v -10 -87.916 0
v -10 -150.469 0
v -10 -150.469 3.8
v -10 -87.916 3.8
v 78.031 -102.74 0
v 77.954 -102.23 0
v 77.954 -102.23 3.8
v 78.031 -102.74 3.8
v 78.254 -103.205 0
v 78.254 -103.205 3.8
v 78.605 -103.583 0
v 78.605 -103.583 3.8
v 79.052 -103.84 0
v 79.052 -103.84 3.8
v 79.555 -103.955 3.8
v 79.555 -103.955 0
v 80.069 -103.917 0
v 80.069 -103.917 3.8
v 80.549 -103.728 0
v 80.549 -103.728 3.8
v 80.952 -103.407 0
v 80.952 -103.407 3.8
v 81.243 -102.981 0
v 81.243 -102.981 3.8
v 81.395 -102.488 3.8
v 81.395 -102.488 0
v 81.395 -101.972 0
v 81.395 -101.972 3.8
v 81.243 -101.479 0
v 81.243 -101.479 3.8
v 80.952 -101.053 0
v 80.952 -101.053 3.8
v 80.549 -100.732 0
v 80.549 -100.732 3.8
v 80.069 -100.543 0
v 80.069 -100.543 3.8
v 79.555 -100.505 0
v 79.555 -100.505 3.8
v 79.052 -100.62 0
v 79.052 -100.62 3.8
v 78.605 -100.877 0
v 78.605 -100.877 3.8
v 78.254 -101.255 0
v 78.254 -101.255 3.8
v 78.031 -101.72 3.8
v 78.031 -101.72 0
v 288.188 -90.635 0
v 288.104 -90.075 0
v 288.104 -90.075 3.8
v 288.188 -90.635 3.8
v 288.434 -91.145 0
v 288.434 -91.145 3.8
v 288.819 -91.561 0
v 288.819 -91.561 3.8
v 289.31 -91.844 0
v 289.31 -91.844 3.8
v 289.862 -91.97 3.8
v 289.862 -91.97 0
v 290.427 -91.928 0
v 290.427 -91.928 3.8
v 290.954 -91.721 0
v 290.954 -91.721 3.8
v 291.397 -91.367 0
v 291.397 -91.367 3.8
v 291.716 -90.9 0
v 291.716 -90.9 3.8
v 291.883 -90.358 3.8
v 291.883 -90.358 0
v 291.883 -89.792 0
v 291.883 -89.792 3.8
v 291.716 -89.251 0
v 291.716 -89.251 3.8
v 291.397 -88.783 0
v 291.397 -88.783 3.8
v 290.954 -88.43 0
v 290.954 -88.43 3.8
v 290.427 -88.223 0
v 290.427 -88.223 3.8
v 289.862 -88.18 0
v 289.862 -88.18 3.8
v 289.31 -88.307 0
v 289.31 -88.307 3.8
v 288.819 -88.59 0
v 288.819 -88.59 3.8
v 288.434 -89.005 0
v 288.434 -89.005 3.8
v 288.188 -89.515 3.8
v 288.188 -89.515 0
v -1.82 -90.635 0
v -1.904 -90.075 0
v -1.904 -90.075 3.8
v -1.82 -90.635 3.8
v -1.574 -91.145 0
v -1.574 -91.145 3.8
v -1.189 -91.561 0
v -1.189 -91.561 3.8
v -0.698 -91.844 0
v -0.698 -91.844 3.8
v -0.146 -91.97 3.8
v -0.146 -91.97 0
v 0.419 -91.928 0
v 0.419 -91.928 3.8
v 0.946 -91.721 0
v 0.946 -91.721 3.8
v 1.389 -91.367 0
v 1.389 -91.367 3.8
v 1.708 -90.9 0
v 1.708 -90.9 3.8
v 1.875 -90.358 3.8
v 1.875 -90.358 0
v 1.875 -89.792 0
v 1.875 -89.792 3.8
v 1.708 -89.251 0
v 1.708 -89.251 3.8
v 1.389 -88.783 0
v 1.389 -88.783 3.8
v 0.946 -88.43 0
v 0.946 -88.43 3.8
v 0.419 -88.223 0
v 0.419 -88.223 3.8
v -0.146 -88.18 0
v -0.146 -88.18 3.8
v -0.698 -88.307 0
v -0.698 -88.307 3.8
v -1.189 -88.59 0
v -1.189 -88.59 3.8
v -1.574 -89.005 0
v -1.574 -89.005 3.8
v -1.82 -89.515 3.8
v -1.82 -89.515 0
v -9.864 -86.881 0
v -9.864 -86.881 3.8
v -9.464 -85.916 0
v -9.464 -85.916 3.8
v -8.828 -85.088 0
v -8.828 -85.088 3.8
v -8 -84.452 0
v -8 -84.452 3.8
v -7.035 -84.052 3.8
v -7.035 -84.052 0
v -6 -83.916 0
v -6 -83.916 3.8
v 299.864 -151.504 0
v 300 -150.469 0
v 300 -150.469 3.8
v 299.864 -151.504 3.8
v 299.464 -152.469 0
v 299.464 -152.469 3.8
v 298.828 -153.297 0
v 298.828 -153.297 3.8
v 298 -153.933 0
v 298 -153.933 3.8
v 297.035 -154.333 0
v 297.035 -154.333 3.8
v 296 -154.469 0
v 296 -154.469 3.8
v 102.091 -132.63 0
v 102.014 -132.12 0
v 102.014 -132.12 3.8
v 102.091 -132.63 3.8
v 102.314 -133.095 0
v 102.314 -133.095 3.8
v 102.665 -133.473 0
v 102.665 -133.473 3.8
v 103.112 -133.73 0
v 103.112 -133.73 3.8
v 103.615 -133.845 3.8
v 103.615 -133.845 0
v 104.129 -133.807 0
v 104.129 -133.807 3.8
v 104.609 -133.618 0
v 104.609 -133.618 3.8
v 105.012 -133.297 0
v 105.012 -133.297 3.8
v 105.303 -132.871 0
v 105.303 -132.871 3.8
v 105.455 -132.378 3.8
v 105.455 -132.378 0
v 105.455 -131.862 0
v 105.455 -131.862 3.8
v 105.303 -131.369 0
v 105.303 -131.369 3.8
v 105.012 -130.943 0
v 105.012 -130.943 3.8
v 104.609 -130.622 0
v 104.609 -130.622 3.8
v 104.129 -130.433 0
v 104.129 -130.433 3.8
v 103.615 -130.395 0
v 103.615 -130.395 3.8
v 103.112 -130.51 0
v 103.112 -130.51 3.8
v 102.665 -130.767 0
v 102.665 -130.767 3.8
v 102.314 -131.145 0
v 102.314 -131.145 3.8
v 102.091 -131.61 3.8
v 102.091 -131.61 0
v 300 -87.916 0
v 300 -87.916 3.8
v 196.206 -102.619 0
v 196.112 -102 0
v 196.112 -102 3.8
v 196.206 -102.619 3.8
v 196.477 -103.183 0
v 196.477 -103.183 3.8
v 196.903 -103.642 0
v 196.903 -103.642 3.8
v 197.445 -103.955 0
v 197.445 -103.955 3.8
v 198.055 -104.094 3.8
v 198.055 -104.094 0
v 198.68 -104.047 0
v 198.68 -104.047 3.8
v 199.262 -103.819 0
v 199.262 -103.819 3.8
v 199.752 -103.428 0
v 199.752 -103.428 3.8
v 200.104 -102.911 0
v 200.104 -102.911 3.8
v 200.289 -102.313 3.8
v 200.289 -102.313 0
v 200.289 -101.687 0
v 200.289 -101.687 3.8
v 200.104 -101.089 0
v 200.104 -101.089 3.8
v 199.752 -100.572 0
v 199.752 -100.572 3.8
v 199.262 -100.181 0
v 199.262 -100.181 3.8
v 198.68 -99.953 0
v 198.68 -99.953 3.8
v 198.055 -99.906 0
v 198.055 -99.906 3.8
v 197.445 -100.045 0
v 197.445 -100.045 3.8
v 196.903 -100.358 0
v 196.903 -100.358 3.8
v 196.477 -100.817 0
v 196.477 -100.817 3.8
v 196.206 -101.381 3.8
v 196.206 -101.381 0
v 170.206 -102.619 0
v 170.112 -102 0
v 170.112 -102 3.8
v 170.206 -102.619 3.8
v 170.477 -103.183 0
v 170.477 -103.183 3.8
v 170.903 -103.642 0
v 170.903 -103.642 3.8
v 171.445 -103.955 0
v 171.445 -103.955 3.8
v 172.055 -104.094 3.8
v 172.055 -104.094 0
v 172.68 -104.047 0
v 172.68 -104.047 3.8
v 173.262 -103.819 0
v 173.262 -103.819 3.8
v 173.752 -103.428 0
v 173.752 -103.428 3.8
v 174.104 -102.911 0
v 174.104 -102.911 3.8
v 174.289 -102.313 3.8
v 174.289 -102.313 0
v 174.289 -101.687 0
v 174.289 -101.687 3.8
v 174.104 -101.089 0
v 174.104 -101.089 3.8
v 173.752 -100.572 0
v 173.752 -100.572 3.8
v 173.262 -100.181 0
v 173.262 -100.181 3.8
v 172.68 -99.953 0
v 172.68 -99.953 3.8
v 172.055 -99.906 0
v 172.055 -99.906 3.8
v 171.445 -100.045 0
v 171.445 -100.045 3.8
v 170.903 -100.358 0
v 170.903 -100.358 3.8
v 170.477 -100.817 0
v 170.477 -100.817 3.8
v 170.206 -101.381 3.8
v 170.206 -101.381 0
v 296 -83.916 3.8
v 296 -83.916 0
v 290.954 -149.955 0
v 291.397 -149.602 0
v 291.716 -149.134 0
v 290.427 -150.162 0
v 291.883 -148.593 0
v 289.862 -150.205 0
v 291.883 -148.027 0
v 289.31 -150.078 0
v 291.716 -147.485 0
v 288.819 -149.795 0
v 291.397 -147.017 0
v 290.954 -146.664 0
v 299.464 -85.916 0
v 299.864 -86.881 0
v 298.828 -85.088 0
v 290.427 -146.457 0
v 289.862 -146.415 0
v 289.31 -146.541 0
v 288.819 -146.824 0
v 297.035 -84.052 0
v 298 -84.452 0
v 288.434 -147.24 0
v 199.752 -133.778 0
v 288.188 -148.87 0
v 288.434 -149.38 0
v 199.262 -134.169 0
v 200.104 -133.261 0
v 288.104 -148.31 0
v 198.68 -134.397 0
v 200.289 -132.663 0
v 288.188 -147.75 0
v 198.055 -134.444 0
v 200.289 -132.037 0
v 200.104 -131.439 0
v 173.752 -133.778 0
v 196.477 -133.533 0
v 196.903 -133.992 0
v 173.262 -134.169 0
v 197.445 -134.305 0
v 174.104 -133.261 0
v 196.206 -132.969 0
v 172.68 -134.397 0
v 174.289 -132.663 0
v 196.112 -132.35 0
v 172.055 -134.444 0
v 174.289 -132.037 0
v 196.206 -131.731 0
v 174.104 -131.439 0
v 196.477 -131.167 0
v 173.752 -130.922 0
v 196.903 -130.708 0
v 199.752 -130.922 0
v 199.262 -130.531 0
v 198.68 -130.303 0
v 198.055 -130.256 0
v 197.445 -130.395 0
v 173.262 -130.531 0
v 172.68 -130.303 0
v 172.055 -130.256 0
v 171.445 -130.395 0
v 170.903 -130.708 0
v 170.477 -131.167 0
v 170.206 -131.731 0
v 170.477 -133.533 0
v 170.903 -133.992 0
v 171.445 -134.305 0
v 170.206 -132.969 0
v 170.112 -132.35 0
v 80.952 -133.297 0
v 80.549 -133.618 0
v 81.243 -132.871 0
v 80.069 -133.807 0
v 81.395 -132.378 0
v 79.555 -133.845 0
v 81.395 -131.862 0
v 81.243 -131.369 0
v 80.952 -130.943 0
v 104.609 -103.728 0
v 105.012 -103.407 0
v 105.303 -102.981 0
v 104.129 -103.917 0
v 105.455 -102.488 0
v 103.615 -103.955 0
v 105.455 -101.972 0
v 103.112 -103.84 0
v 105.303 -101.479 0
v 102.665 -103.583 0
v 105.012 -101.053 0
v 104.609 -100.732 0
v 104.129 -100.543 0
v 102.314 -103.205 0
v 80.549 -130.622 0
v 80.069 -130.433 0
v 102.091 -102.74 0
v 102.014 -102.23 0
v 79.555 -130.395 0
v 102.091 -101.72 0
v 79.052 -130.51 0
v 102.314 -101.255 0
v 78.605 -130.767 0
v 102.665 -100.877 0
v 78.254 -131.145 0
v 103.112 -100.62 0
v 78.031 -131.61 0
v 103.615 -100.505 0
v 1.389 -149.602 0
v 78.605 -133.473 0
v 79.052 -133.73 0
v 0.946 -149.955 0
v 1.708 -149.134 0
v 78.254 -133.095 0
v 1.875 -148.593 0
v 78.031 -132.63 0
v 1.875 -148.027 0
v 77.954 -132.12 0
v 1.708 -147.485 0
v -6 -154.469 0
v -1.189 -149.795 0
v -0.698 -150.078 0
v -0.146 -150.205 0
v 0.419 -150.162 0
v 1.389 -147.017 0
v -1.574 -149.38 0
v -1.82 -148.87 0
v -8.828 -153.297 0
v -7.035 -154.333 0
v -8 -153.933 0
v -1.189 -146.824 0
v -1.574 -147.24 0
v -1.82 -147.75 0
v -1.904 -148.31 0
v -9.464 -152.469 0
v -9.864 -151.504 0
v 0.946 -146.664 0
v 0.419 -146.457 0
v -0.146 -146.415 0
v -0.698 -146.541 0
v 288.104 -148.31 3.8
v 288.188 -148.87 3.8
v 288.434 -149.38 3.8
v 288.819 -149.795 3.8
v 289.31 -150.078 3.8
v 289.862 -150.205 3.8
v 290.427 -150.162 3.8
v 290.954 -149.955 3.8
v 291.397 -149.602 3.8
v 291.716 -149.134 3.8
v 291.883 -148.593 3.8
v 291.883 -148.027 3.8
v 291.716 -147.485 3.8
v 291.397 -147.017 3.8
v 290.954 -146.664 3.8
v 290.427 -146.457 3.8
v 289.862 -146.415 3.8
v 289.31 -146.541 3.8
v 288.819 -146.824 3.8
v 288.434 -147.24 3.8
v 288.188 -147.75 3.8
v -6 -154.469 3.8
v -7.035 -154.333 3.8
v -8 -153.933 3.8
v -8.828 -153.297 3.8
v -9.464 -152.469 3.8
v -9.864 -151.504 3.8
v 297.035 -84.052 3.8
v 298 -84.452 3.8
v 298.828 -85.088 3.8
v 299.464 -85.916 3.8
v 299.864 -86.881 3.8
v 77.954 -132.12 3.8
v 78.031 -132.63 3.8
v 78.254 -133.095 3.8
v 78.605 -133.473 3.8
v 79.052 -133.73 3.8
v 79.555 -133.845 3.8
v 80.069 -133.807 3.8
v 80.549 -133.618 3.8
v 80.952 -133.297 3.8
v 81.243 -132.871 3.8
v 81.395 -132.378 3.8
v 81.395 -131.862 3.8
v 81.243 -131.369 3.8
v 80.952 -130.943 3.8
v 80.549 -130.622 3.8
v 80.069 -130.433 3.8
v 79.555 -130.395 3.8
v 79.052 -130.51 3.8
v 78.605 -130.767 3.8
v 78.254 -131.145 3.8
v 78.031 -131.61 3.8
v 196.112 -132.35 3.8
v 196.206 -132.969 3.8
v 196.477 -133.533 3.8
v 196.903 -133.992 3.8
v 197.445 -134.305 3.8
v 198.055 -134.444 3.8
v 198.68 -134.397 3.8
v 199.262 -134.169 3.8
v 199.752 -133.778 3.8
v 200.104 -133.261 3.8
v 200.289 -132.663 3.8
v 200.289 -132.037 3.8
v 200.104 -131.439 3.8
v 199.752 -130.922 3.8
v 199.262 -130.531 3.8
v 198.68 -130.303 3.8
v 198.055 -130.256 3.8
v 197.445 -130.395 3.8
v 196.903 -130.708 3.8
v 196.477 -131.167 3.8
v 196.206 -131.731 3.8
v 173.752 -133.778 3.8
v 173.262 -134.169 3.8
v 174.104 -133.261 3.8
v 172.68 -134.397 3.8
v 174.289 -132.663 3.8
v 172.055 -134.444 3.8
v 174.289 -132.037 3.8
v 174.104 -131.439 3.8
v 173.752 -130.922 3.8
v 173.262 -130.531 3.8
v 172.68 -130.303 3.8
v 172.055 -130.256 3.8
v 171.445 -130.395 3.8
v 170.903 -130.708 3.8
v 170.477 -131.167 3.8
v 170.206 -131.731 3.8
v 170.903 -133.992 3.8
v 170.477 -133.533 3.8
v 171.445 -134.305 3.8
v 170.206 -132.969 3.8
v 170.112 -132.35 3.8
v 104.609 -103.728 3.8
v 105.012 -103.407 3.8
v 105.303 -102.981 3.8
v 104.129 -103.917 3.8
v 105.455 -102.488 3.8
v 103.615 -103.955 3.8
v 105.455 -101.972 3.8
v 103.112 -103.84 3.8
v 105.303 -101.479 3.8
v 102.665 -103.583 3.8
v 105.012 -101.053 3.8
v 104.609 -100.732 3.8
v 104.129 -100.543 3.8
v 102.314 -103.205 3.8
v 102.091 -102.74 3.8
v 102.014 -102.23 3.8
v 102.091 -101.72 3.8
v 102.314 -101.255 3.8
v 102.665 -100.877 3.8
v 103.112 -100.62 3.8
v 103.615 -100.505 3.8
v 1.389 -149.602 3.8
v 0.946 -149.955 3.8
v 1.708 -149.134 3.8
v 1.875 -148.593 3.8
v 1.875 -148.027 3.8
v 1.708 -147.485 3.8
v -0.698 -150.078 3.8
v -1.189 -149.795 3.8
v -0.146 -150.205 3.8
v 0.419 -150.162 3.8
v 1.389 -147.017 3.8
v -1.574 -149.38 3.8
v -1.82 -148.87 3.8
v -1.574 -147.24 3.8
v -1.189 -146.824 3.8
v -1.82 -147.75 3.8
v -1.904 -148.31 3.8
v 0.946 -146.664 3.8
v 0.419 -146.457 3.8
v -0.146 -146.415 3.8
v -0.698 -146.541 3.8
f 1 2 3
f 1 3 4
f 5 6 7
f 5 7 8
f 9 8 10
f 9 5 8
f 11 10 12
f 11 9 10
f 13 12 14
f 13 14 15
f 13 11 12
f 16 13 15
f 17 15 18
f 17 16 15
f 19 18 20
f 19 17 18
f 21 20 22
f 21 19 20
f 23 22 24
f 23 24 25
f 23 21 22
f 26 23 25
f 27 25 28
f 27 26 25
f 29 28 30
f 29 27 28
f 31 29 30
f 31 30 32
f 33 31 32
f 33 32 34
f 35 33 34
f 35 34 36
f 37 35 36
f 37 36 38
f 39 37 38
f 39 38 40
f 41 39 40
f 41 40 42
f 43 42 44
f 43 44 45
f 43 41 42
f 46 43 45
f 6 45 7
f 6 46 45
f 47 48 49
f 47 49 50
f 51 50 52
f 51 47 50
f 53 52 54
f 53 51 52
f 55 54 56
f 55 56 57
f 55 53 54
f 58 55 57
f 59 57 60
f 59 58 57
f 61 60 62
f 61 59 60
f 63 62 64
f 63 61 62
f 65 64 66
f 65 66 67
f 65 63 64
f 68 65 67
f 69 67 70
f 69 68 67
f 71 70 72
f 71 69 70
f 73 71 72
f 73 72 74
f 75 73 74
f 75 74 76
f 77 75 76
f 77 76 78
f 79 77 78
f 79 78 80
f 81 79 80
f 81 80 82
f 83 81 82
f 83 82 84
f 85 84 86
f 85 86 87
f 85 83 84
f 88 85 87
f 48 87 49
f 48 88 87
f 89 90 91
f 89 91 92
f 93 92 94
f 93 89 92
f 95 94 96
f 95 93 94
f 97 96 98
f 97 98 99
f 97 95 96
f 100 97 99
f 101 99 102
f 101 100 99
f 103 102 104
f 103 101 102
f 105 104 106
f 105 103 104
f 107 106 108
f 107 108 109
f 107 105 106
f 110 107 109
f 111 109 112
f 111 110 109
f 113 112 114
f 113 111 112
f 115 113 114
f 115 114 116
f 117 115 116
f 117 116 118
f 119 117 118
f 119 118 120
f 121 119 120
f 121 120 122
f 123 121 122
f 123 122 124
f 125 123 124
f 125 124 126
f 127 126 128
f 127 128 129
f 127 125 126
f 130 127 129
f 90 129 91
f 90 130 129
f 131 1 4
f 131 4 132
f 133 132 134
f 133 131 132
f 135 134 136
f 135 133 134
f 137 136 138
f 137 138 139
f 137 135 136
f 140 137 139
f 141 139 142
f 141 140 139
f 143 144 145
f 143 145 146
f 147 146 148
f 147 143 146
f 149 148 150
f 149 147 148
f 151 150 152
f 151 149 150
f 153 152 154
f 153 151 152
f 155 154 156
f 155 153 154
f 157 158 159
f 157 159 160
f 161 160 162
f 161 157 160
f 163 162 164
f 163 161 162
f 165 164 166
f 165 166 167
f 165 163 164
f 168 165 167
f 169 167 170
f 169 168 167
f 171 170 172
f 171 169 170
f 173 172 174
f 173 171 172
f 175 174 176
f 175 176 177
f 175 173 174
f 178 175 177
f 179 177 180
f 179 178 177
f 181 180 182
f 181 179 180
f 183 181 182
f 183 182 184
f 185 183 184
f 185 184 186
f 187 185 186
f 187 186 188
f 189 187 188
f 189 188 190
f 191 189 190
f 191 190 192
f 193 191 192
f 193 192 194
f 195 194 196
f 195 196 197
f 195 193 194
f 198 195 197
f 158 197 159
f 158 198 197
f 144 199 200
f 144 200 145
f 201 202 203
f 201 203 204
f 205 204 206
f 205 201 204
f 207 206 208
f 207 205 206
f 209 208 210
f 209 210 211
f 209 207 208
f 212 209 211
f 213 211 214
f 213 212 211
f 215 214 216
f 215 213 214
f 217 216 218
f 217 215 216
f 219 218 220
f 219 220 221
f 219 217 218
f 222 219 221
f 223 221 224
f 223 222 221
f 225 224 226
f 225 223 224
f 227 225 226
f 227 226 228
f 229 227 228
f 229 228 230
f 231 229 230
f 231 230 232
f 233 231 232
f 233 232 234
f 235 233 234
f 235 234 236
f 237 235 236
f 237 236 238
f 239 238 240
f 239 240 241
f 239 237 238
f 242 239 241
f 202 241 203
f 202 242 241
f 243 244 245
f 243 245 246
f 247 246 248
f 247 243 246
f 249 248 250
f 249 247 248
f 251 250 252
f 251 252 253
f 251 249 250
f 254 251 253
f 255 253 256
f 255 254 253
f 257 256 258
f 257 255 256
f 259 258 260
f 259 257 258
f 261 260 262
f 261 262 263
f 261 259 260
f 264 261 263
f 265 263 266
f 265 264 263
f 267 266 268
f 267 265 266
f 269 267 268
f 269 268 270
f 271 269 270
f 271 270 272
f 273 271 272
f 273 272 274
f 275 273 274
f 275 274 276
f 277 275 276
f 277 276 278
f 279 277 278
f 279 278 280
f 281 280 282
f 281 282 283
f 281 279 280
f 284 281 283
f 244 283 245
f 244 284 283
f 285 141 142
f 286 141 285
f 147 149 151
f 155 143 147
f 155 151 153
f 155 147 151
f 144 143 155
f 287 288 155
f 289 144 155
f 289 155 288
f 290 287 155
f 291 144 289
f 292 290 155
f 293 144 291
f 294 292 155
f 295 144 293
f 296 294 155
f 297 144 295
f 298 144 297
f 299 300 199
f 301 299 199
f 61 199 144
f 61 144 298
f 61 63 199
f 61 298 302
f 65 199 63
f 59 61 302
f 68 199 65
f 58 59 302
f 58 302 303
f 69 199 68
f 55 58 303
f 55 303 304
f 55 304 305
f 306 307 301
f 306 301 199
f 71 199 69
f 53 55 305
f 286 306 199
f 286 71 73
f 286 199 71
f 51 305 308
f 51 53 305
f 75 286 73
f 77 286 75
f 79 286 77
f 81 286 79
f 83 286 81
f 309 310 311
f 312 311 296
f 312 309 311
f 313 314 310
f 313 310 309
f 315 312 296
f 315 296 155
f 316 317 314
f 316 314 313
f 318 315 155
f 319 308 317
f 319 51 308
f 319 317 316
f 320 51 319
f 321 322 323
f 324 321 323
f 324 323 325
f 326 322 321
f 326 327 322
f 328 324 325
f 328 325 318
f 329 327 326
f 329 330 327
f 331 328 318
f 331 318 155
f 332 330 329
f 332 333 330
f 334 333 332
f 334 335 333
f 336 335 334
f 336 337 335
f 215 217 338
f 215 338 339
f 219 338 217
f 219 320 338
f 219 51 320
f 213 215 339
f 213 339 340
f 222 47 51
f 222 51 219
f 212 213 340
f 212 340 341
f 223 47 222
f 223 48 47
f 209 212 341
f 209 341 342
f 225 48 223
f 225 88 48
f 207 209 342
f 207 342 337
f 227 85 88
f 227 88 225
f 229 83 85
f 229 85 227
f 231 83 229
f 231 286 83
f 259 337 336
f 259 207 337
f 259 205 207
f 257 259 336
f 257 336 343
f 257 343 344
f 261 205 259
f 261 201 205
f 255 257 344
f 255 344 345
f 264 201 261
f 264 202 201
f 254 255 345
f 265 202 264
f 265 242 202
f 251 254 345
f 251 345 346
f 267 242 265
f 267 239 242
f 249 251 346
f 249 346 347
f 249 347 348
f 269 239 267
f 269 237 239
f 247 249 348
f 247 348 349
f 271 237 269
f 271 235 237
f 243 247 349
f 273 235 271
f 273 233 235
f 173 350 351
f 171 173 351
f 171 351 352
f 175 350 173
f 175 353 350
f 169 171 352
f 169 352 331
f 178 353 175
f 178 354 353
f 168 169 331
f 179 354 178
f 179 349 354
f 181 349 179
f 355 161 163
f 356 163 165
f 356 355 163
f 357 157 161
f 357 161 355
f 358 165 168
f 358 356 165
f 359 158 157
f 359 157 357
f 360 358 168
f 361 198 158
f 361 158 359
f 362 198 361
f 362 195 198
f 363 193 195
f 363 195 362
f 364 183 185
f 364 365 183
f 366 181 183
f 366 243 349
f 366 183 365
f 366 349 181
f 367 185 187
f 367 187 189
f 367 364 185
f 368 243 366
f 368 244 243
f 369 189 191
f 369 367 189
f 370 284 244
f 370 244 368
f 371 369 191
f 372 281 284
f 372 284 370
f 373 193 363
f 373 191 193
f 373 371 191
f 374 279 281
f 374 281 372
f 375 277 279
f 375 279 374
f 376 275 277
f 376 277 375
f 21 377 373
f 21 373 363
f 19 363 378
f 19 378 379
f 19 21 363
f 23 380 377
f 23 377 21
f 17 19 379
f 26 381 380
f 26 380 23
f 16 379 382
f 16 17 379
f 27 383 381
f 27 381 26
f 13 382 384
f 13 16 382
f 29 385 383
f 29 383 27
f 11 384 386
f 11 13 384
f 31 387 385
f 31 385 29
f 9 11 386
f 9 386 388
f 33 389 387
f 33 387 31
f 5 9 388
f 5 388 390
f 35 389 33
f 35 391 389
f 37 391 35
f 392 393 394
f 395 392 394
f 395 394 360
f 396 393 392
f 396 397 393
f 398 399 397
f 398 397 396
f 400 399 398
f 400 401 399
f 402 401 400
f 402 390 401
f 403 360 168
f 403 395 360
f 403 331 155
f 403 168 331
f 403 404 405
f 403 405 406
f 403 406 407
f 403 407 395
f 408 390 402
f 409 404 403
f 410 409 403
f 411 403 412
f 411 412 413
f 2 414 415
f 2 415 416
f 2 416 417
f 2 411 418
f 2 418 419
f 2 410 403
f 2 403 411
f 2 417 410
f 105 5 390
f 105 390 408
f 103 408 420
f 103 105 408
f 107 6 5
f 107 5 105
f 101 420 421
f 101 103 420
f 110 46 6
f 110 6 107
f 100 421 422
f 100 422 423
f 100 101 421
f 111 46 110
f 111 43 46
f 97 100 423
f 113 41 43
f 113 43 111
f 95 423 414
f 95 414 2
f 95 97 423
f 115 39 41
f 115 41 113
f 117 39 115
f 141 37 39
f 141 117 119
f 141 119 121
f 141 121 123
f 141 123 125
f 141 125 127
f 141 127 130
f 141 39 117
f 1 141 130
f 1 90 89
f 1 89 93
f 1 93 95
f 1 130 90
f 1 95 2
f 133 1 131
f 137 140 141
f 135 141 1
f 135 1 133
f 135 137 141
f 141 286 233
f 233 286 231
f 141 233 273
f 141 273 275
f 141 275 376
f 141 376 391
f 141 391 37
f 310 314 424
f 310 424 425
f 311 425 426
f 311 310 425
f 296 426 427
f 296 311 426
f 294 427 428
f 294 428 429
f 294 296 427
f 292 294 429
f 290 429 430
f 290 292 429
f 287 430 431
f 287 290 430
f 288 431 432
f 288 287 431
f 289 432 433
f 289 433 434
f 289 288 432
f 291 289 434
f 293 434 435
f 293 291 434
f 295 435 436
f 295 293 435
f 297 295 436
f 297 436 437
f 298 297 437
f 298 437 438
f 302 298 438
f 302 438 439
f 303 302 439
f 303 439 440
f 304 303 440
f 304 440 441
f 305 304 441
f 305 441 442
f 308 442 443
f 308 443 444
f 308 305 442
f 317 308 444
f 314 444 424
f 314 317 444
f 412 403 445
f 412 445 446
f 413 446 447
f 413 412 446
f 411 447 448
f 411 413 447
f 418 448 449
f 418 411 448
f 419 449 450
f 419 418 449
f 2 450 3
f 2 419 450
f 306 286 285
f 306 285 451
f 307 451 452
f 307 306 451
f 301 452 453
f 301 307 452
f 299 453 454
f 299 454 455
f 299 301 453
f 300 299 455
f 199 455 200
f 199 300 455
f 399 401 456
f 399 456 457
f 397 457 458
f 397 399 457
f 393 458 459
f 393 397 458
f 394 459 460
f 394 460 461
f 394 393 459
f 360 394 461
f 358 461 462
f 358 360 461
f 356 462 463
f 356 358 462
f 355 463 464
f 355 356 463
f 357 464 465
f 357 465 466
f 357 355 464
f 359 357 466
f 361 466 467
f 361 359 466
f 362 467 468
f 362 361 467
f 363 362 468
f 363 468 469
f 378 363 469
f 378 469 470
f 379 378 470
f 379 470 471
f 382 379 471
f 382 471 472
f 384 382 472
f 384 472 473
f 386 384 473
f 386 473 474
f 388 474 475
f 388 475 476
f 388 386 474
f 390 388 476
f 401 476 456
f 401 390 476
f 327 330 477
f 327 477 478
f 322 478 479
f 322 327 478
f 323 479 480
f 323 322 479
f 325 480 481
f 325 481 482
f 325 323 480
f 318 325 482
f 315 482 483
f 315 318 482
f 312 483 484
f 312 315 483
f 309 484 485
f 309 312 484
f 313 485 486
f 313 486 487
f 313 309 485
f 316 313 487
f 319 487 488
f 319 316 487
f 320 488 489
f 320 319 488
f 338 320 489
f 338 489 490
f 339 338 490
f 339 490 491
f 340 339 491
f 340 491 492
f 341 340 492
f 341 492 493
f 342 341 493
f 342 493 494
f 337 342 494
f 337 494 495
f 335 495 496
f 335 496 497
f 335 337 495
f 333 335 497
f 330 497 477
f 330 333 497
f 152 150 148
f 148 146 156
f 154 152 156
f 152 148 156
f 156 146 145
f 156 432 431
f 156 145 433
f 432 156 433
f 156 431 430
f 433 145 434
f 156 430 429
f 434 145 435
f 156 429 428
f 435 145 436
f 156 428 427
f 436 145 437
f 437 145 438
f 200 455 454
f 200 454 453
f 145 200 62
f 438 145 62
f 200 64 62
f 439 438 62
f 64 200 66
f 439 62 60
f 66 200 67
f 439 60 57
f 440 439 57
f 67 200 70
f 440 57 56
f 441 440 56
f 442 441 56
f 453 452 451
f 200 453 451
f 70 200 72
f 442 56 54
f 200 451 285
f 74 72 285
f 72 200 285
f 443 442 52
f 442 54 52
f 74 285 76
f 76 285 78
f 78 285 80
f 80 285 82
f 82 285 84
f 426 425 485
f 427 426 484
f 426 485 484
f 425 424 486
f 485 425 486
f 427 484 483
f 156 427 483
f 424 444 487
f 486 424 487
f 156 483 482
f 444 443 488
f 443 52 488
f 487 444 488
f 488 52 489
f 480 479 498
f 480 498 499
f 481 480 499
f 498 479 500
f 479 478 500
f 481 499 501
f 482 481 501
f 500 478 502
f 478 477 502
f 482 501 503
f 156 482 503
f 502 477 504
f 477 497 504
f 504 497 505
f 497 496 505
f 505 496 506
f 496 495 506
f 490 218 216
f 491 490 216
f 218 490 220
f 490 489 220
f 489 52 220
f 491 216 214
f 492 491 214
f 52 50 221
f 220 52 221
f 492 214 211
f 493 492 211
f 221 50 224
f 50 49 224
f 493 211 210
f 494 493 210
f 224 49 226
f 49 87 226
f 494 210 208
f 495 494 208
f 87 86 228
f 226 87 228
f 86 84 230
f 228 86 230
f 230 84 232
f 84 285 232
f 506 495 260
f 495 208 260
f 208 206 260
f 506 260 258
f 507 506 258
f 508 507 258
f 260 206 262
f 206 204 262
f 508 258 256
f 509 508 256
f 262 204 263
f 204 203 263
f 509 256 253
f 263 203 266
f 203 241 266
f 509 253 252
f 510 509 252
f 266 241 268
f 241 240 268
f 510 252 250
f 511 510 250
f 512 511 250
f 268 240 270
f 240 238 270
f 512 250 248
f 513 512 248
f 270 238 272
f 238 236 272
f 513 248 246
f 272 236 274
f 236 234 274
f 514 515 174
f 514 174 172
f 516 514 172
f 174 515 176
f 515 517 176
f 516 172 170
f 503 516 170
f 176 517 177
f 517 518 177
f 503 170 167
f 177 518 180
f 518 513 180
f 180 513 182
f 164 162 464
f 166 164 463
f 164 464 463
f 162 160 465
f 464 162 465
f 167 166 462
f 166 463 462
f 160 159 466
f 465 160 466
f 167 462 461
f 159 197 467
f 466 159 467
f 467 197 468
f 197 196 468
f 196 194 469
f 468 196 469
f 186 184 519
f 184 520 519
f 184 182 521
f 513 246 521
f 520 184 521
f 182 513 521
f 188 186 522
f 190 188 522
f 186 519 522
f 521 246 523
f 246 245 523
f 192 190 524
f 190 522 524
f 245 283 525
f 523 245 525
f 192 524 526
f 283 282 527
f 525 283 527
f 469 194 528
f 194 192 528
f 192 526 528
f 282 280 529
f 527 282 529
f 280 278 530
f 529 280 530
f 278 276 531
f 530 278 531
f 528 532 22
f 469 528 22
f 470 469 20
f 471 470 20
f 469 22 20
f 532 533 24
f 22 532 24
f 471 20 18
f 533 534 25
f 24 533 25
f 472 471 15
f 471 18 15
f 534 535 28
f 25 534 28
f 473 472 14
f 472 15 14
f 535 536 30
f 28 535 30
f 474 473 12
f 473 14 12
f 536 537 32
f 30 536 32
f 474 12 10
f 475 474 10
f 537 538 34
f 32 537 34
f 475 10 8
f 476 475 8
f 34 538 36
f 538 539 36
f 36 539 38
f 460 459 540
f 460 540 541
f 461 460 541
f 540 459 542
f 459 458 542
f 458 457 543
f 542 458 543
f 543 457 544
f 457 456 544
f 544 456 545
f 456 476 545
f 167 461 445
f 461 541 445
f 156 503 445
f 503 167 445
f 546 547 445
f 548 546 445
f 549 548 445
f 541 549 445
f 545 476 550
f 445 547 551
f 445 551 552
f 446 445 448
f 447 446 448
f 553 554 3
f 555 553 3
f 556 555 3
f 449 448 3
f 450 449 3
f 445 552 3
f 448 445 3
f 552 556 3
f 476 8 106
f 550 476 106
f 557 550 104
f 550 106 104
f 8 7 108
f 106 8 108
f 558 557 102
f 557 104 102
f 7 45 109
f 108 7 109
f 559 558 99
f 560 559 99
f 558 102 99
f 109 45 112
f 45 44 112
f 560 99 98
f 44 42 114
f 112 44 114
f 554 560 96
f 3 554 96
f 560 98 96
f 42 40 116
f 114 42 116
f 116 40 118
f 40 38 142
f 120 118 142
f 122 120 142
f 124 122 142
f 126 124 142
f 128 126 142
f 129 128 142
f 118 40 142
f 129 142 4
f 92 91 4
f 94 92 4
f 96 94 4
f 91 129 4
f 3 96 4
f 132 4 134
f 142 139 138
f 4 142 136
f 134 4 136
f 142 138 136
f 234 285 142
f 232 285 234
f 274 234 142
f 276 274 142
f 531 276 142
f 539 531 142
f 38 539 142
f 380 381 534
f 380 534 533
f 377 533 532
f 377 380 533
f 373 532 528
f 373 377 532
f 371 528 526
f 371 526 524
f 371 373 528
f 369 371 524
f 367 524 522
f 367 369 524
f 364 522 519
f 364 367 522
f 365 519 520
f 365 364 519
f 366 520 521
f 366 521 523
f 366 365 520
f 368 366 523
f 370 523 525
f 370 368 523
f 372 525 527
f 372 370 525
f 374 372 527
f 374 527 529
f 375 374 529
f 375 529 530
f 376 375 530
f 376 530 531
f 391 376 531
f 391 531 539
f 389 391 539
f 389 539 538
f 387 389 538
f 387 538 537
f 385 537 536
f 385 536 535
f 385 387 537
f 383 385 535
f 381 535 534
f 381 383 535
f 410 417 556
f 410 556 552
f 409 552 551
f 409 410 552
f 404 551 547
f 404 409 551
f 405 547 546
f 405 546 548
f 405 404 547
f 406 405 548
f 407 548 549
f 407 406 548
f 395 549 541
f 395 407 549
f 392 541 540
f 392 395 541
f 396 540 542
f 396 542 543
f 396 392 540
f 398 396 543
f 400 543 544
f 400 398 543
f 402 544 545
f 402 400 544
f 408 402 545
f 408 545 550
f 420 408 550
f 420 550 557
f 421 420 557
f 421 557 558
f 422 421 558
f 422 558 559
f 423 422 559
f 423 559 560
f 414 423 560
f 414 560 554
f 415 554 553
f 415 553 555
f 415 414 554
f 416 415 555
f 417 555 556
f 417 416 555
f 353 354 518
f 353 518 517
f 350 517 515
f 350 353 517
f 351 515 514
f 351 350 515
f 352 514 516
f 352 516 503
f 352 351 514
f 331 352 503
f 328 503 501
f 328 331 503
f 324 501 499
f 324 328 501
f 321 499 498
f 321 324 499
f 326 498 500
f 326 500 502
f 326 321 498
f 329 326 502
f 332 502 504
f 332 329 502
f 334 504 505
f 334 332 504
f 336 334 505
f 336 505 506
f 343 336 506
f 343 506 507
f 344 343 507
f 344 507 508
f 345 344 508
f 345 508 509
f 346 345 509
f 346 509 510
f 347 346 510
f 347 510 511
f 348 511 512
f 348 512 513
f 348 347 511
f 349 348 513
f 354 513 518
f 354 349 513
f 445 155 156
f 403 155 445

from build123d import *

# Parameters (mm, degrees)
SKETCH1_R           = 2.1
SKETCH1_R_2         = 1.9
SKETCH1_R_3         = 1.73
BOSS_EXTRUDE1_DEPTH = 3.8


with BuildPart() as part:
    # Sketch1 → Boss-Extrude1 (new body)
    with BuildSketch(Plane.XY):
        with BuildLine():
            Line((-10, -150.468857407), (-10, -87.916121505))
            ThreePointArc((-10, -87.916121505), (-8.828427125, -85.08769438), (-6, -83.916121505))
            Line((-6, -83.916121505), (296, -83.916121505))
            ThreePointArc((296, -83.916121505), (298.828427125, -85.08769438), (300, -87.916121505))
            Line((300, -87.916121505), (300, -150.468857407))
            ThreePointArc((300, -150.468857407), (298.828427125, -153.297284532), (296, -154.468857407))
            Line((296, -154.468857407), (-6, -154.468857407))
            ThreePointArc((-6, -154.468857407), (-8.828427125, -153.297284532), (-10, -150.468857407))
        make_face()
        with Locations(Location((172.212346295, -102, 0), (0, 0, 180))):
            Circle(SKETCH1_R, mode=Mode.SUBTRACT)
        with Locations(Location((290.004037955, -90.075164194, 0), (0, 0, 180))):
            Circle(SKETCH1_R_2, mode=Mode.SUBTRACT)
        with Locations(Location((290.004037955, -148.309814719, 0), (0, 0, 180))):
            Circle(SKETCH1_R_2, mode=Mode.SUBTRACT)
        with Locations(Location((-0.004037955, -148.309814719, 0), (0, 0, 180))):
            Circle(SKETCH1_R_2, mode=Mode.SUBTRACT)
        with Locations(Location((-0.004037955, -90.075164194, 0), (0, 0, 180))):
            Circle(SKETCH1_R_2, mode=Mode.SUBTRACT)
        with Locations(Location((198.212346295, -102, 0), (0, 0, 180))):
            Circle(SKETCH1_R, mode=Mode.SUBTRACT)
        with Locations(Location((172.212346295, -132.35, 0), (0, 0, 180))):
            Circle(SKETCH1_R, mode=Mode.SUBTRACT)
        with Locations(Location((198.212346295, -132.35, 0), (0, 0, 180))):
            Circle(SKETCH1_R, mode=Mode.SUBTRACT)
        with Locations(Location((79.683867595, -132.12, 0), (0, 0, 180))):
            Circle(SKETCH1_R_3, mode=Mode.SUBTRACT)
        with Locations(Location((79.683867595, -102.23, 0), (0, 0, 180))):
            Circle(SKETCH1_R_3, mode=Mode.SUBTRACT)
        with Locations(Location((103.743867595, -102.23, 0), (0, 0, 180))):
            Circle(SKETCH1_R_3, mode=Mode.SUBTRACT)
        with Locations(Location((103.743867595, -132.12, 0), (0, 0, 180))):
            Circle(SKETCH1_R_3, mode=Mode.SUBTRACT)
    extrude(amount=BOSS_EXTRUDE1_DEPTH)


solid = part.part
